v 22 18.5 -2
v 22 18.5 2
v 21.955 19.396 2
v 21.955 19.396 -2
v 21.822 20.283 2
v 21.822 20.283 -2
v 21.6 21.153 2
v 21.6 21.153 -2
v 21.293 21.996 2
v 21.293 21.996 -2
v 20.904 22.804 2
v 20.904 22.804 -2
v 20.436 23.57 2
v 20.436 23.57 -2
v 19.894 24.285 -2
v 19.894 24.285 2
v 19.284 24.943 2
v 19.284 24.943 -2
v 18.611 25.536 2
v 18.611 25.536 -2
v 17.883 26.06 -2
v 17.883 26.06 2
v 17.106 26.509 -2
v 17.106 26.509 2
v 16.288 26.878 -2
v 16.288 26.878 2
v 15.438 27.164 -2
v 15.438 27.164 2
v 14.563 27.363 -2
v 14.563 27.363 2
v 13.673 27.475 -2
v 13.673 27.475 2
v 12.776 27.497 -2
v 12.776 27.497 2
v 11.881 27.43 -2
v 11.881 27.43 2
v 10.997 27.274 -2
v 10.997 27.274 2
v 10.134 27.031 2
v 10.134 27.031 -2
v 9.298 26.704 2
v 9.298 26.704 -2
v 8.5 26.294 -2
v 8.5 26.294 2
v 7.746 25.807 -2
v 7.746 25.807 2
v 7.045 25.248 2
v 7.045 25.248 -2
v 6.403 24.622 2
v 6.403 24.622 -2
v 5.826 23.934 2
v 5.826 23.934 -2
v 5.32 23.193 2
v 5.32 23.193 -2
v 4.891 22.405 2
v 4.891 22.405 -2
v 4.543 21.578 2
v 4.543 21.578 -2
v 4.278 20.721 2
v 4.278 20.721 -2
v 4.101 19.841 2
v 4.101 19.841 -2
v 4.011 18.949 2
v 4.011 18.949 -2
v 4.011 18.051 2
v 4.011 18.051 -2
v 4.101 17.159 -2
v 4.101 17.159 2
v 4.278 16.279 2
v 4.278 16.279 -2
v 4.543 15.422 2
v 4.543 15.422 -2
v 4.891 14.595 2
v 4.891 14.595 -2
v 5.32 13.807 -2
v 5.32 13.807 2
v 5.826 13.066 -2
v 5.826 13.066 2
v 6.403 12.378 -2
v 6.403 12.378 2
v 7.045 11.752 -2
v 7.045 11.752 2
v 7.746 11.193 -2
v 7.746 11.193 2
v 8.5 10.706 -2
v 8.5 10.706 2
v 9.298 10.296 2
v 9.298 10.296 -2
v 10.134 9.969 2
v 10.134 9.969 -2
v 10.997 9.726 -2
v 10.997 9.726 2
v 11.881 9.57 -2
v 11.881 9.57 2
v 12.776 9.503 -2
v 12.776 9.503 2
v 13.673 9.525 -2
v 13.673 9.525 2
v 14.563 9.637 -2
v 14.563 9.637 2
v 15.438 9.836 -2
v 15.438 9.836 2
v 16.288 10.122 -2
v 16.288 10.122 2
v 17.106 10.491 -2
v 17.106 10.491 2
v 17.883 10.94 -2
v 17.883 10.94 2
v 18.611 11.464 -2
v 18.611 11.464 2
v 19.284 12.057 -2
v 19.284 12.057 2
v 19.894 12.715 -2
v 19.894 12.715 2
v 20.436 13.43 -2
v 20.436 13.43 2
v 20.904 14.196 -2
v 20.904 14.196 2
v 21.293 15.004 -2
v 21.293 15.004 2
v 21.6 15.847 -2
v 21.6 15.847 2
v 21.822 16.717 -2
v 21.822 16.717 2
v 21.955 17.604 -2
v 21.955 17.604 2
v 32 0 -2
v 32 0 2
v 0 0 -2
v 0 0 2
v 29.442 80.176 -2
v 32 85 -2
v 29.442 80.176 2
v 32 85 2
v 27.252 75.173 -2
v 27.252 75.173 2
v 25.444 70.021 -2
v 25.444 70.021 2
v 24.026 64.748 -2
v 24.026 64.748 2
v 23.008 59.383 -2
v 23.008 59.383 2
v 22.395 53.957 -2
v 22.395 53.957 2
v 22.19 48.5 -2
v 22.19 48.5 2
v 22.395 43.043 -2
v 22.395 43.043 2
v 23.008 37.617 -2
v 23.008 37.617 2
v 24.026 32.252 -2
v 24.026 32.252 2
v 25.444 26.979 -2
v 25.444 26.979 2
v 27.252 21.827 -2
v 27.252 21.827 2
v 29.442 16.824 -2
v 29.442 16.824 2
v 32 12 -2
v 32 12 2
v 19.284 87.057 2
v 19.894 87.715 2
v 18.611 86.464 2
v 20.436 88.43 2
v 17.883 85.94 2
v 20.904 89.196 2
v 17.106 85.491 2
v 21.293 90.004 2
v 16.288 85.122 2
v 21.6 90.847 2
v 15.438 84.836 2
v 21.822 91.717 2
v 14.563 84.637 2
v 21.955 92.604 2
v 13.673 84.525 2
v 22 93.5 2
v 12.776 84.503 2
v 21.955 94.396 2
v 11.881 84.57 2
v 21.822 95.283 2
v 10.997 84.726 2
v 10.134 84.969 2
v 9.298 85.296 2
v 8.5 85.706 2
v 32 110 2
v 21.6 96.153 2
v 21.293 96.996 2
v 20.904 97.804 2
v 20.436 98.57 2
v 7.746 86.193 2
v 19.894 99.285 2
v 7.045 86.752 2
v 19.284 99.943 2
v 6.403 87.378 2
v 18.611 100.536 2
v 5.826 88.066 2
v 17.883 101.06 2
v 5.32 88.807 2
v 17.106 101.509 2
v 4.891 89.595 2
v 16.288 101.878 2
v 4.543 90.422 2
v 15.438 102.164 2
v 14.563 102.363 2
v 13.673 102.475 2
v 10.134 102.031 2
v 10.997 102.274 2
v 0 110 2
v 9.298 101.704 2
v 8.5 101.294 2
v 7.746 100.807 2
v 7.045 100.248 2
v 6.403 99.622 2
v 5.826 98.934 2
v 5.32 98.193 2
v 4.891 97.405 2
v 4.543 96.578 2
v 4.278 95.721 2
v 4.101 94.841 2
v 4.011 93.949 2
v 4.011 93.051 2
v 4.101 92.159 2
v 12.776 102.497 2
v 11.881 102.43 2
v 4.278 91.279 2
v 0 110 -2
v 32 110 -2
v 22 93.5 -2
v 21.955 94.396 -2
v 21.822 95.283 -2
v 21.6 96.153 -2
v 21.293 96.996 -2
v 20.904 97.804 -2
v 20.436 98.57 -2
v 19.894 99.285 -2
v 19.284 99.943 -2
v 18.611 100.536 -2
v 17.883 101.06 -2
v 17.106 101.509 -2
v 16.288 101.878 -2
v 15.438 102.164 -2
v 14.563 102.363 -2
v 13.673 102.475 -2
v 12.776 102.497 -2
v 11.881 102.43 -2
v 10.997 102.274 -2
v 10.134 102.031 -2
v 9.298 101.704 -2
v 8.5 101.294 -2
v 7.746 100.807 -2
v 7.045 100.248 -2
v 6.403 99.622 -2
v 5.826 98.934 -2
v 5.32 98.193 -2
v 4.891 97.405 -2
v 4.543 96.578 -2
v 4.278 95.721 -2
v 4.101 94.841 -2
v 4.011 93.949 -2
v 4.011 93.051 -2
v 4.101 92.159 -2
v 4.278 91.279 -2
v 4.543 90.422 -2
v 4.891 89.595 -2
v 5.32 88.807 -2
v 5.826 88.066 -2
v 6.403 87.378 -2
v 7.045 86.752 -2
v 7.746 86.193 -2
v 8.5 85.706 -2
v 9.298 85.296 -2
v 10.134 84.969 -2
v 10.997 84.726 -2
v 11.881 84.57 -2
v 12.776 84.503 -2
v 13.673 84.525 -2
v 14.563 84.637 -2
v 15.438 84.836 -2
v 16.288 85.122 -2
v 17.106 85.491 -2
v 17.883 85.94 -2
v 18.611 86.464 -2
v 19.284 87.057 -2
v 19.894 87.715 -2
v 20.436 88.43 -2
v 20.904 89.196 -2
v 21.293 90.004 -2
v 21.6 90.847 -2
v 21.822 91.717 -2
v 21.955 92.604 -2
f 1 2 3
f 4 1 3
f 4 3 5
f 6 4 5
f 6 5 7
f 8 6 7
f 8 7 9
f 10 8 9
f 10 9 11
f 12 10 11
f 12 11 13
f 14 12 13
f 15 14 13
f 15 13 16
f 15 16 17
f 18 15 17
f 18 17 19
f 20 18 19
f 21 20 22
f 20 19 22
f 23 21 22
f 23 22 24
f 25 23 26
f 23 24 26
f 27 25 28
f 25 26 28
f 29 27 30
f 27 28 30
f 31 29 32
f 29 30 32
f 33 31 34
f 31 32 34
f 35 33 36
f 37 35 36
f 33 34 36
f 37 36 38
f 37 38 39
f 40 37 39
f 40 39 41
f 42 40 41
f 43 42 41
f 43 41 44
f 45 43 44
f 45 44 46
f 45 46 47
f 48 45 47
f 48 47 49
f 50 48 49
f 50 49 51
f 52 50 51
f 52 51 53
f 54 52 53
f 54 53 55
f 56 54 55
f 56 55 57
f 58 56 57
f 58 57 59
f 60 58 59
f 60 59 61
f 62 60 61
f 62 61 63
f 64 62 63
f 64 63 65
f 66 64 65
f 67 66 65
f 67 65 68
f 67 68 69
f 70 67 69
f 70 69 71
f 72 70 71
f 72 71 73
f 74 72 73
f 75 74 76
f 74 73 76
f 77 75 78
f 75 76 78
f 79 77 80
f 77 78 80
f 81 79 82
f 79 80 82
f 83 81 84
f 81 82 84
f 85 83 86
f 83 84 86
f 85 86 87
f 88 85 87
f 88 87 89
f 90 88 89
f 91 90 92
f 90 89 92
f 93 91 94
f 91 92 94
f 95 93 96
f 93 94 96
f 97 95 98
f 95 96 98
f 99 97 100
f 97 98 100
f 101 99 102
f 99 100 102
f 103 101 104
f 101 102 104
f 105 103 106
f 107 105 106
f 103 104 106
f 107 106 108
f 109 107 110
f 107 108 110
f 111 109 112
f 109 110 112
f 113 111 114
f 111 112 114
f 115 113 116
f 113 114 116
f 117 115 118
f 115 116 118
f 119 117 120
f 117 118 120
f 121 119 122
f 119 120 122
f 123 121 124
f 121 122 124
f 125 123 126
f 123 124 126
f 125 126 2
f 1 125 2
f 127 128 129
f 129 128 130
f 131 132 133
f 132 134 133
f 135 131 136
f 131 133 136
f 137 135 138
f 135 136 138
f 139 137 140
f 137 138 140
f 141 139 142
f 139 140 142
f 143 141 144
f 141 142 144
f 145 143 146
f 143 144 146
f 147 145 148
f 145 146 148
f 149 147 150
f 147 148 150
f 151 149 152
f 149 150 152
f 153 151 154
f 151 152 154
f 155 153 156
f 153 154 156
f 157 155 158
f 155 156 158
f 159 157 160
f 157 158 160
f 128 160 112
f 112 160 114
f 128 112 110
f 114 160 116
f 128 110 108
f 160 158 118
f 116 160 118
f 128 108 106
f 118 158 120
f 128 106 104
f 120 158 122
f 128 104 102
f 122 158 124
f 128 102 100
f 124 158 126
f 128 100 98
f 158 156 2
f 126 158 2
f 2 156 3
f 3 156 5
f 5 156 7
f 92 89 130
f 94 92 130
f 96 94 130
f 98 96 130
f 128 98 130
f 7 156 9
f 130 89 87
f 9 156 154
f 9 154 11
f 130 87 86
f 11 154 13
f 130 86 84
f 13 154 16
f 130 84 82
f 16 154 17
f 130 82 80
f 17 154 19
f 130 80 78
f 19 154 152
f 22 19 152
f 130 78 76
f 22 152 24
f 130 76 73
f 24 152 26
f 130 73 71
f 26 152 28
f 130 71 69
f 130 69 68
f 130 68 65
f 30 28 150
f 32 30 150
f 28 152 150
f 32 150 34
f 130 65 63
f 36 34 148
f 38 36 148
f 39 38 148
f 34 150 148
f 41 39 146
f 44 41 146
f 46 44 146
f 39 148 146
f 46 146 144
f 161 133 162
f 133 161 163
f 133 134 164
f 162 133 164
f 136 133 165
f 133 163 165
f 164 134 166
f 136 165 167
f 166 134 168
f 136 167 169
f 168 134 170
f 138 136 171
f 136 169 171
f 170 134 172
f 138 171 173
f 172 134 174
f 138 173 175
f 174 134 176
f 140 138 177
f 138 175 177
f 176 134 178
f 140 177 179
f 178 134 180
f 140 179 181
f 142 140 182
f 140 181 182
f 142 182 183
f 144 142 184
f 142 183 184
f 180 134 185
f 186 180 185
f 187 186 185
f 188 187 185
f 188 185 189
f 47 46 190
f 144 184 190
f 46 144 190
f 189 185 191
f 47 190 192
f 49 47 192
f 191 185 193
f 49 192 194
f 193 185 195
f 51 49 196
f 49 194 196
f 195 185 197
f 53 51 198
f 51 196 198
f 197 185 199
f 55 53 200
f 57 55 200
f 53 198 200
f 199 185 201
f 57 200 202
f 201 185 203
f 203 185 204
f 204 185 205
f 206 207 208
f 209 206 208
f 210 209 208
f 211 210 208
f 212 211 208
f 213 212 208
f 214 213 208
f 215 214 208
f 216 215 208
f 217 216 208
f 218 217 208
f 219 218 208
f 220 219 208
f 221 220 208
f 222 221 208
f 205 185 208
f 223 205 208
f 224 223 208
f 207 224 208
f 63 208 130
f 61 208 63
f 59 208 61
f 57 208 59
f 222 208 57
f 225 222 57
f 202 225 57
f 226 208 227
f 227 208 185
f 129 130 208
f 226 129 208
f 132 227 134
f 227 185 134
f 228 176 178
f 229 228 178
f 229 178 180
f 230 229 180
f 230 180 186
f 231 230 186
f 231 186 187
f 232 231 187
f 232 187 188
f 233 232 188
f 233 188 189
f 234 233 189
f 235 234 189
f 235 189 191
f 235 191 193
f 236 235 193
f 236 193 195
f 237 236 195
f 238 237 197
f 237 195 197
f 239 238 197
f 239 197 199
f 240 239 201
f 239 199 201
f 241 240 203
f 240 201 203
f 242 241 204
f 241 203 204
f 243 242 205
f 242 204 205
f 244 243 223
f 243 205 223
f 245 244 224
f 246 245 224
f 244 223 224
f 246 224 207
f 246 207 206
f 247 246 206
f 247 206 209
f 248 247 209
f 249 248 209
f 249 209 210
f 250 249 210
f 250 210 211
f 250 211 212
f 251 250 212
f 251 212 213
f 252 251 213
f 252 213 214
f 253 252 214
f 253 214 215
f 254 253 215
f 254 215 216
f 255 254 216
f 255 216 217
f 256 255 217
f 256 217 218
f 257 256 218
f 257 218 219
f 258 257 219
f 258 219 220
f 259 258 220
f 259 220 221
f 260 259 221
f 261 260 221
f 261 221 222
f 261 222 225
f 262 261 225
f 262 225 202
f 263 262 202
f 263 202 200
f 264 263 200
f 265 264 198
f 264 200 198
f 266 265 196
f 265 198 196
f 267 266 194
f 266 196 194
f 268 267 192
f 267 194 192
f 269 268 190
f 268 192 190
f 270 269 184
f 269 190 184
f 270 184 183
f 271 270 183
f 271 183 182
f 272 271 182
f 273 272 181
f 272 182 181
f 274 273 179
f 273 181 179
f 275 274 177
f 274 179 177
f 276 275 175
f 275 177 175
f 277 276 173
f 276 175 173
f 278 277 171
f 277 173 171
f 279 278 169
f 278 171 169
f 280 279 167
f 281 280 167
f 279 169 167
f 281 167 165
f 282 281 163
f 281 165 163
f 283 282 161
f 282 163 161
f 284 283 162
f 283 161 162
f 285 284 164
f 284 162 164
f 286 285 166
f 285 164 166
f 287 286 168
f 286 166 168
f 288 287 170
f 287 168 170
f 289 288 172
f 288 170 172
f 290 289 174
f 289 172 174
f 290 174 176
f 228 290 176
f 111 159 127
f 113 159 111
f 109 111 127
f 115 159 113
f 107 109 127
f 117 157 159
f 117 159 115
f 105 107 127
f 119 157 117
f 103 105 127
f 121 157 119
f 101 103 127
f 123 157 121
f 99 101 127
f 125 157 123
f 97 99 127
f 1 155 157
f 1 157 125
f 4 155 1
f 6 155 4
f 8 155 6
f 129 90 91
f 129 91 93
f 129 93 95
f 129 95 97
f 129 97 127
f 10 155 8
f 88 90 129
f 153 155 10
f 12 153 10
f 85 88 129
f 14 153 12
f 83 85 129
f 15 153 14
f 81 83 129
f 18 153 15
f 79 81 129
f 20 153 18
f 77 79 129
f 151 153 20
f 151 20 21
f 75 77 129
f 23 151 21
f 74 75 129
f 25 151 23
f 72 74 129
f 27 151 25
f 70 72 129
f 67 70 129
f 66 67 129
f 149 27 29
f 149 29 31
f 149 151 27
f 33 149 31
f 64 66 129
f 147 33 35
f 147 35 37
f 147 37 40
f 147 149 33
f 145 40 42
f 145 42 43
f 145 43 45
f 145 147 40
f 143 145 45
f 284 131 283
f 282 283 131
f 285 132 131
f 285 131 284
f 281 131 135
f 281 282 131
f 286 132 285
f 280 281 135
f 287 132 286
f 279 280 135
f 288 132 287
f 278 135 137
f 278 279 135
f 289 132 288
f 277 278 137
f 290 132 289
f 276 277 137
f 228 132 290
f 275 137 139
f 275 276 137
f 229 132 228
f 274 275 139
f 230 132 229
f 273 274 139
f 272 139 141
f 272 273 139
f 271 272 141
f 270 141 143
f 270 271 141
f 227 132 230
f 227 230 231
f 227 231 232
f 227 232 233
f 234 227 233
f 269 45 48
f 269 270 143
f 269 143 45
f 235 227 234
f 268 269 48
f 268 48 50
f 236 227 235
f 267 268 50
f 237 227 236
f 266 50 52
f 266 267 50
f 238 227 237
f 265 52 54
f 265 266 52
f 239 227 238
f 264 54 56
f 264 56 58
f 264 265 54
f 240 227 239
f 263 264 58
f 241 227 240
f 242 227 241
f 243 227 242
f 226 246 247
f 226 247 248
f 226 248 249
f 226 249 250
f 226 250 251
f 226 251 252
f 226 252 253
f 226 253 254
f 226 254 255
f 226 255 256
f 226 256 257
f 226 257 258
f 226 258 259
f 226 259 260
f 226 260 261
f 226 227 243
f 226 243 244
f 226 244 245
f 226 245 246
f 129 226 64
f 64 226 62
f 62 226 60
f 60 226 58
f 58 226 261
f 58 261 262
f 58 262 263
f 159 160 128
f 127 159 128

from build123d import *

# Parameters (mm, degrees)
Y_KSEKLIK_EKSTR_ZYON1_DEPTH = 2
IZIM2_R                     = 9
KES_EKSTR_ZYON1_DEPTH       = 5


with BuildPart() as part:
    # Çizim1 → Yükseklik-Ekstrüzyon1 (new body, symmetric)
    with BuildSketch(Plane.XY):
        with BuildLine():
            Line((0, 0), (0, 110))
            Line((0, 110), (32, 110))
            Line((32, 110), (32, 85))
            ThreePointArc((32, 85), (22.190316578, 48.5), (32, 12))
            Line((32, 12), (32, 0))
            Line((32, 0), (0, 0))
        make_face()
    extrude(amount=Y_KSEKLIK_EKSTR_ZYON1_DEPTH, both=True)

    # Çizim2 → Kes-Ekstrüzyon1 (cut, through all)
    with BuildSketch(Plane.XY.offset(2)):
        with Locations((13, 93.5)):
            Circle(IZIM2_R)
        with Locations((13, 18.5)):
            Circle(IZIM2_R)
    extrude(amount=-KES_EKSTR_ZYON1_DEPTH, mode=Mode.SUBTRACT)


solid = part.part
